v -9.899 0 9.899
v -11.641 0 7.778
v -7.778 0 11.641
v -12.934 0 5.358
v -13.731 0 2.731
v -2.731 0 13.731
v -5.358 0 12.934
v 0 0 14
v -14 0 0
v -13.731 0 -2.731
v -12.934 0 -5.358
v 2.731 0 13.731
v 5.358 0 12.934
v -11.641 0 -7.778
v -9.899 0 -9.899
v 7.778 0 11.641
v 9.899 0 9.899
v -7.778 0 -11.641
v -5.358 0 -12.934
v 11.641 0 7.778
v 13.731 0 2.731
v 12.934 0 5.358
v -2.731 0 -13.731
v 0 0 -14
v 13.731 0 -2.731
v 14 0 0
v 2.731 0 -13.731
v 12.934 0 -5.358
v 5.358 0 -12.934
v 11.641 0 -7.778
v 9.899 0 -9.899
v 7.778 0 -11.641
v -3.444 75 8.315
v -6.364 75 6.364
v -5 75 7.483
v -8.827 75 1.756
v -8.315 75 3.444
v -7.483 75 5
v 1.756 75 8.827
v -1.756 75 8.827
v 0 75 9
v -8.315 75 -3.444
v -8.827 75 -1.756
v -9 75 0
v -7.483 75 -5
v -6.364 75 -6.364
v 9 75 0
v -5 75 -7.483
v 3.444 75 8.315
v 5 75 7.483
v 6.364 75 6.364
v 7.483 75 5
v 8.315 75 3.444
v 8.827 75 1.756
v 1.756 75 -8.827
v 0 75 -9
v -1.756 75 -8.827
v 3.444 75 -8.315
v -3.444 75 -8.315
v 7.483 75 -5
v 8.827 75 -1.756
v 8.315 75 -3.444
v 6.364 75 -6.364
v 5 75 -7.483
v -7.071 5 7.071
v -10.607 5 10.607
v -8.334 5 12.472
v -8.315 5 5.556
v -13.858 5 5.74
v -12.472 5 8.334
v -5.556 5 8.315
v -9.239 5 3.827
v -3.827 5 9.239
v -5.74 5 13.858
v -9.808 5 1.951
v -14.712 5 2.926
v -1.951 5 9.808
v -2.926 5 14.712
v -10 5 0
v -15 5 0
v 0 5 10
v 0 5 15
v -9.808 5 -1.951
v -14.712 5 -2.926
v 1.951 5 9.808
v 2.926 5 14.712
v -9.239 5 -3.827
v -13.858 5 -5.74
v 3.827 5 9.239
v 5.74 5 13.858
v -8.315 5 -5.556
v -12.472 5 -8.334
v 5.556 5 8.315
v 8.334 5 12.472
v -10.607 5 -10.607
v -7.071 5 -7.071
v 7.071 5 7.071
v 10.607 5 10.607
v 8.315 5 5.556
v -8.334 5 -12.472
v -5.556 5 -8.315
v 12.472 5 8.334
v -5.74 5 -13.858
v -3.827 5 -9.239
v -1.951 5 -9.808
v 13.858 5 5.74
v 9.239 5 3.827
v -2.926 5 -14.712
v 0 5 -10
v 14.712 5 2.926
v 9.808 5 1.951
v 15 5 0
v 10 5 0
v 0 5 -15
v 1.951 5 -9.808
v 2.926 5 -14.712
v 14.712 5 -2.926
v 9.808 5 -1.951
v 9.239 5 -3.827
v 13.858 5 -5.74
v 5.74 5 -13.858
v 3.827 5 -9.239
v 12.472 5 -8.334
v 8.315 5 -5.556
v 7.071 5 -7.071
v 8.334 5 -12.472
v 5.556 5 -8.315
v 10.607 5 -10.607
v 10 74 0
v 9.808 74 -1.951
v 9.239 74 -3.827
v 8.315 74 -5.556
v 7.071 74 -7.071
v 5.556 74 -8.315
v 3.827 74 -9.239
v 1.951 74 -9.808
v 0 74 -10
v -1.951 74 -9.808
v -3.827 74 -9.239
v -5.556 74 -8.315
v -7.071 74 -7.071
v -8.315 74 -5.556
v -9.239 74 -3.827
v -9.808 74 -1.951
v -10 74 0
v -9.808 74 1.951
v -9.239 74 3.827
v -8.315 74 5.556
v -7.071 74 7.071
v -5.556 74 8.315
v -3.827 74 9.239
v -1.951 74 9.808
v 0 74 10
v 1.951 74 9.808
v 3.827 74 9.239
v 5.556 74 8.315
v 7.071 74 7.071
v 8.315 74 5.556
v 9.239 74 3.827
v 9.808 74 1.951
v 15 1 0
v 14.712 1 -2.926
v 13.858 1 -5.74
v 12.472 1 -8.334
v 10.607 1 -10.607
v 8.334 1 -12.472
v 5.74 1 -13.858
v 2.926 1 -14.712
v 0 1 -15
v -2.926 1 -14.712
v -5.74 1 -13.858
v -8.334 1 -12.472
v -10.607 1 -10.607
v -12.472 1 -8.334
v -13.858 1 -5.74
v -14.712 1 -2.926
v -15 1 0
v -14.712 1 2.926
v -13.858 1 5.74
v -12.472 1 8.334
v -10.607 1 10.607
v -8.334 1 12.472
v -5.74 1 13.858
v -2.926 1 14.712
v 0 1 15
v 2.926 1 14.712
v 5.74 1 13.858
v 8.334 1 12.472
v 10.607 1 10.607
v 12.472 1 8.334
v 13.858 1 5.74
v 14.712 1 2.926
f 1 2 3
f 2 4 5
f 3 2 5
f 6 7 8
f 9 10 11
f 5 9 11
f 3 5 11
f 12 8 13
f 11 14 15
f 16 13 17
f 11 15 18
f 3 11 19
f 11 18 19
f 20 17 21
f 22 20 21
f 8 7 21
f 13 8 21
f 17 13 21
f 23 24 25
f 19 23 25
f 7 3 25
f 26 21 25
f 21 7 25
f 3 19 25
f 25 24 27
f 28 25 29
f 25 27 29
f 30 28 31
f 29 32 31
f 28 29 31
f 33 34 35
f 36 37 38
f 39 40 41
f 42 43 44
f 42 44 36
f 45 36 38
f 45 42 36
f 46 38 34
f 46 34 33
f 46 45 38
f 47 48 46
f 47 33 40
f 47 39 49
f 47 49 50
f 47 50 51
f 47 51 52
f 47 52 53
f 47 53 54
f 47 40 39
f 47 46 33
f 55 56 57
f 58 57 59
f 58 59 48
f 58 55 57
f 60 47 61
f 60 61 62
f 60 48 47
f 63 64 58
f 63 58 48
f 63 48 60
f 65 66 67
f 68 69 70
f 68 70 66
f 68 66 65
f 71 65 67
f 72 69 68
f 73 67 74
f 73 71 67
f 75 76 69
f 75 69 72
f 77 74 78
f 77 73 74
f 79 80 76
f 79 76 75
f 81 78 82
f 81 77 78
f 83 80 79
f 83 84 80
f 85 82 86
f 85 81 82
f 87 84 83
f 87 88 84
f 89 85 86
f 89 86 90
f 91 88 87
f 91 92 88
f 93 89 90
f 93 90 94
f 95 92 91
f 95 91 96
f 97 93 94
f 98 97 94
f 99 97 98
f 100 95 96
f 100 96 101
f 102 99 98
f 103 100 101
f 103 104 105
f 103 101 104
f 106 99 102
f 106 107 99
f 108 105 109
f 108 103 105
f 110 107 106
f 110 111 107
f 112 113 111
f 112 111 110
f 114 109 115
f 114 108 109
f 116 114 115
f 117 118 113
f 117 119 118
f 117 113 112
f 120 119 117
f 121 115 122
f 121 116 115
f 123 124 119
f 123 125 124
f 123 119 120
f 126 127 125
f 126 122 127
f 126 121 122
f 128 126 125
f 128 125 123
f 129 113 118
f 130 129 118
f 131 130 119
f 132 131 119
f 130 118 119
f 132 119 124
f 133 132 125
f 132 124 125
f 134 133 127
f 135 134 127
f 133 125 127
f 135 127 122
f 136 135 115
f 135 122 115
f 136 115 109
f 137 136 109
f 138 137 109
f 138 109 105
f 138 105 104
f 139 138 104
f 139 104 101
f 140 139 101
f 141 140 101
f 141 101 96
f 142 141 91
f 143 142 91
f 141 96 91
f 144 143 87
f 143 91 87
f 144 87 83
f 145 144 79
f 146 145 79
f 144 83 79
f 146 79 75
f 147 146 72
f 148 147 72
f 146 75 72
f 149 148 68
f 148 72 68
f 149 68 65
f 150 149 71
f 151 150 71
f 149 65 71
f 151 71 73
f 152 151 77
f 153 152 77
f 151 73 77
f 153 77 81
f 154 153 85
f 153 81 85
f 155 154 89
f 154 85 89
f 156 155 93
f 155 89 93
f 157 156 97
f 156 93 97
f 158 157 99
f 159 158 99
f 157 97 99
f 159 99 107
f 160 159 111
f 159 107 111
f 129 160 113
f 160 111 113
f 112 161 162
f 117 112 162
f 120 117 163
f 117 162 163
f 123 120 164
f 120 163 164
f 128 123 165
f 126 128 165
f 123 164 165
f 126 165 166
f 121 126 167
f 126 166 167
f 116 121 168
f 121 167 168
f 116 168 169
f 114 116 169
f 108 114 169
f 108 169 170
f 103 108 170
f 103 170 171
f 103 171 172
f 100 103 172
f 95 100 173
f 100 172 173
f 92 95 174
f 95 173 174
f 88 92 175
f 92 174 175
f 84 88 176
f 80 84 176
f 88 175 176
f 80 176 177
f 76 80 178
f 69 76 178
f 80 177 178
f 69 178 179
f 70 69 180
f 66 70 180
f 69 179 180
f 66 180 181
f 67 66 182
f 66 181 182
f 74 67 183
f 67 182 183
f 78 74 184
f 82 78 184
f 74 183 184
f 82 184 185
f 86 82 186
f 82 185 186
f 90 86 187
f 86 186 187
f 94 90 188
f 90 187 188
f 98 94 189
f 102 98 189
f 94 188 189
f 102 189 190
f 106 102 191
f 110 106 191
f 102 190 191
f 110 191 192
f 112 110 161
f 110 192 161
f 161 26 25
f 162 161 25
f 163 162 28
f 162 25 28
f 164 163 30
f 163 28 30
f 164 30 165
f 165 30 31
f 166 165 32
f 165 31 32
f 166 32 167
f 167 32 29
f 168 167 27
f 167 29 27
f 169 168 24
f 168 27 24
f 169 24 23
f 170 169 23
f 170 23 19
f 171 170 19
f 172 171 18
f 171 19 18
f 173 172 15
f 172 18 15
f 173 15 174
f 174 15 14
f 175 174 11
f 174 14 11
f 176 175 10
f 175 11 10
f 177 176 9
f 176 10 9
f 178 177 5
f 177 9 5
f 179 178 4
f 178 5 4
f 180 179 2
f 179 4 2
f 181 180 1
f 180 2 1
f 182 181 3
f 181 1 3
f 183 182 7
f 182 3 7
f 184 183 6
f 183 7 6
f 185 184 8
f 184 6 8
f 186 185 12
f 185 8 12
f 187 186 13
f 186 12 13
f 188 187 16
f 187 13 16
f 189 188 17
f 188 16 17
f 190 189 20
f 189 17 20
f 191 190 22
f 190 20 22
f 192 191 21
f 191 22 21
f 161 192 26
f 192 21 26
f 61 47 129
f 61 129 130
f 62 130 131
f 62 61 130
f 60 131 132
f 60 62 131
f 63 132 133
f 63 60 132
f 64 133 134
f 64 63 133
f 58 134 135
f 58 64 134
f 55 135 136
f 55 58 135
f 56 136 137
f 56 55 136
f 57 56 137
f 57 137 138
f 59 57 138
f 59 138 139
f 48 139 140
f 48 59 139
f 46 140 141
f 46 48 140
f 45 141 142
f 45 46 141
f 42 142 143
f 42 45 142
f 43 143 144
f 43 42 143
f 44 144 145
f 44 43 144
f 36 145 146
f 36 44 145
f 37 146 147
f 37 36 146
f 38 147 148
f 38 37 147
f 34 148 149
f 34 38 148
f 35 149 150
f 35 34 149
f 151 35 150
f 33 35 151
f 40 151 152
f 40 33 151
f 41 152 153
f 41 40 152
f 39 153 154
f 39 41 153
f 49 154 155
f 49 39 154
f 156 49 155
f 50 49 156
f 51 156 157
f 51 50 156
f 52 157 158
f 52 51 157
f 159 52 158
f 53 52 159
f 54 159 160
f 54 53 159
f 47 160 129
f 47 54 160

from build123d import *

# Parameters (mm, degrees)
SKETCH_1_R      = 15
EXTRUDE_1_DEPTH = 5
SKETCH_2_R      = 10
EXTRUDE_2_DEPTH = 70
CHAMFER_1_SIZE  = 1


with BuildPart() as part:
    # 草图1 → 凸台-拉伸1 (new body)
    with BuildSketch(Plane(origin=(0, 0, 0), x_dir=(1, 0, 0), z_dir=(0, 1, 0))):
        Circle(SKETCH_1_R)
    extrude(amount=EXTRUDE_1_DEPTH)

    # 草图2 → 凸台-拉伸2 (add)
    with BuildSketch(Plane(origin=(0, 5, 0), x_dir=(1, 0, 0), z_dir=(0, 1, 0))):
        Circle(SKETCH_2_R)
    extrude(amount=EXTRUDE_2_DEPTH)

    # 倒角1
    chamfer_1_edges = [part.edges().sort_by_distance(p)[0] for p in [
        (-15, 0, 0),
        (-10, 75, 0),
    ]]
    chamfer(chamfer_1_edges, length=CHAMFER_1_SIZE)


solid = part.part
